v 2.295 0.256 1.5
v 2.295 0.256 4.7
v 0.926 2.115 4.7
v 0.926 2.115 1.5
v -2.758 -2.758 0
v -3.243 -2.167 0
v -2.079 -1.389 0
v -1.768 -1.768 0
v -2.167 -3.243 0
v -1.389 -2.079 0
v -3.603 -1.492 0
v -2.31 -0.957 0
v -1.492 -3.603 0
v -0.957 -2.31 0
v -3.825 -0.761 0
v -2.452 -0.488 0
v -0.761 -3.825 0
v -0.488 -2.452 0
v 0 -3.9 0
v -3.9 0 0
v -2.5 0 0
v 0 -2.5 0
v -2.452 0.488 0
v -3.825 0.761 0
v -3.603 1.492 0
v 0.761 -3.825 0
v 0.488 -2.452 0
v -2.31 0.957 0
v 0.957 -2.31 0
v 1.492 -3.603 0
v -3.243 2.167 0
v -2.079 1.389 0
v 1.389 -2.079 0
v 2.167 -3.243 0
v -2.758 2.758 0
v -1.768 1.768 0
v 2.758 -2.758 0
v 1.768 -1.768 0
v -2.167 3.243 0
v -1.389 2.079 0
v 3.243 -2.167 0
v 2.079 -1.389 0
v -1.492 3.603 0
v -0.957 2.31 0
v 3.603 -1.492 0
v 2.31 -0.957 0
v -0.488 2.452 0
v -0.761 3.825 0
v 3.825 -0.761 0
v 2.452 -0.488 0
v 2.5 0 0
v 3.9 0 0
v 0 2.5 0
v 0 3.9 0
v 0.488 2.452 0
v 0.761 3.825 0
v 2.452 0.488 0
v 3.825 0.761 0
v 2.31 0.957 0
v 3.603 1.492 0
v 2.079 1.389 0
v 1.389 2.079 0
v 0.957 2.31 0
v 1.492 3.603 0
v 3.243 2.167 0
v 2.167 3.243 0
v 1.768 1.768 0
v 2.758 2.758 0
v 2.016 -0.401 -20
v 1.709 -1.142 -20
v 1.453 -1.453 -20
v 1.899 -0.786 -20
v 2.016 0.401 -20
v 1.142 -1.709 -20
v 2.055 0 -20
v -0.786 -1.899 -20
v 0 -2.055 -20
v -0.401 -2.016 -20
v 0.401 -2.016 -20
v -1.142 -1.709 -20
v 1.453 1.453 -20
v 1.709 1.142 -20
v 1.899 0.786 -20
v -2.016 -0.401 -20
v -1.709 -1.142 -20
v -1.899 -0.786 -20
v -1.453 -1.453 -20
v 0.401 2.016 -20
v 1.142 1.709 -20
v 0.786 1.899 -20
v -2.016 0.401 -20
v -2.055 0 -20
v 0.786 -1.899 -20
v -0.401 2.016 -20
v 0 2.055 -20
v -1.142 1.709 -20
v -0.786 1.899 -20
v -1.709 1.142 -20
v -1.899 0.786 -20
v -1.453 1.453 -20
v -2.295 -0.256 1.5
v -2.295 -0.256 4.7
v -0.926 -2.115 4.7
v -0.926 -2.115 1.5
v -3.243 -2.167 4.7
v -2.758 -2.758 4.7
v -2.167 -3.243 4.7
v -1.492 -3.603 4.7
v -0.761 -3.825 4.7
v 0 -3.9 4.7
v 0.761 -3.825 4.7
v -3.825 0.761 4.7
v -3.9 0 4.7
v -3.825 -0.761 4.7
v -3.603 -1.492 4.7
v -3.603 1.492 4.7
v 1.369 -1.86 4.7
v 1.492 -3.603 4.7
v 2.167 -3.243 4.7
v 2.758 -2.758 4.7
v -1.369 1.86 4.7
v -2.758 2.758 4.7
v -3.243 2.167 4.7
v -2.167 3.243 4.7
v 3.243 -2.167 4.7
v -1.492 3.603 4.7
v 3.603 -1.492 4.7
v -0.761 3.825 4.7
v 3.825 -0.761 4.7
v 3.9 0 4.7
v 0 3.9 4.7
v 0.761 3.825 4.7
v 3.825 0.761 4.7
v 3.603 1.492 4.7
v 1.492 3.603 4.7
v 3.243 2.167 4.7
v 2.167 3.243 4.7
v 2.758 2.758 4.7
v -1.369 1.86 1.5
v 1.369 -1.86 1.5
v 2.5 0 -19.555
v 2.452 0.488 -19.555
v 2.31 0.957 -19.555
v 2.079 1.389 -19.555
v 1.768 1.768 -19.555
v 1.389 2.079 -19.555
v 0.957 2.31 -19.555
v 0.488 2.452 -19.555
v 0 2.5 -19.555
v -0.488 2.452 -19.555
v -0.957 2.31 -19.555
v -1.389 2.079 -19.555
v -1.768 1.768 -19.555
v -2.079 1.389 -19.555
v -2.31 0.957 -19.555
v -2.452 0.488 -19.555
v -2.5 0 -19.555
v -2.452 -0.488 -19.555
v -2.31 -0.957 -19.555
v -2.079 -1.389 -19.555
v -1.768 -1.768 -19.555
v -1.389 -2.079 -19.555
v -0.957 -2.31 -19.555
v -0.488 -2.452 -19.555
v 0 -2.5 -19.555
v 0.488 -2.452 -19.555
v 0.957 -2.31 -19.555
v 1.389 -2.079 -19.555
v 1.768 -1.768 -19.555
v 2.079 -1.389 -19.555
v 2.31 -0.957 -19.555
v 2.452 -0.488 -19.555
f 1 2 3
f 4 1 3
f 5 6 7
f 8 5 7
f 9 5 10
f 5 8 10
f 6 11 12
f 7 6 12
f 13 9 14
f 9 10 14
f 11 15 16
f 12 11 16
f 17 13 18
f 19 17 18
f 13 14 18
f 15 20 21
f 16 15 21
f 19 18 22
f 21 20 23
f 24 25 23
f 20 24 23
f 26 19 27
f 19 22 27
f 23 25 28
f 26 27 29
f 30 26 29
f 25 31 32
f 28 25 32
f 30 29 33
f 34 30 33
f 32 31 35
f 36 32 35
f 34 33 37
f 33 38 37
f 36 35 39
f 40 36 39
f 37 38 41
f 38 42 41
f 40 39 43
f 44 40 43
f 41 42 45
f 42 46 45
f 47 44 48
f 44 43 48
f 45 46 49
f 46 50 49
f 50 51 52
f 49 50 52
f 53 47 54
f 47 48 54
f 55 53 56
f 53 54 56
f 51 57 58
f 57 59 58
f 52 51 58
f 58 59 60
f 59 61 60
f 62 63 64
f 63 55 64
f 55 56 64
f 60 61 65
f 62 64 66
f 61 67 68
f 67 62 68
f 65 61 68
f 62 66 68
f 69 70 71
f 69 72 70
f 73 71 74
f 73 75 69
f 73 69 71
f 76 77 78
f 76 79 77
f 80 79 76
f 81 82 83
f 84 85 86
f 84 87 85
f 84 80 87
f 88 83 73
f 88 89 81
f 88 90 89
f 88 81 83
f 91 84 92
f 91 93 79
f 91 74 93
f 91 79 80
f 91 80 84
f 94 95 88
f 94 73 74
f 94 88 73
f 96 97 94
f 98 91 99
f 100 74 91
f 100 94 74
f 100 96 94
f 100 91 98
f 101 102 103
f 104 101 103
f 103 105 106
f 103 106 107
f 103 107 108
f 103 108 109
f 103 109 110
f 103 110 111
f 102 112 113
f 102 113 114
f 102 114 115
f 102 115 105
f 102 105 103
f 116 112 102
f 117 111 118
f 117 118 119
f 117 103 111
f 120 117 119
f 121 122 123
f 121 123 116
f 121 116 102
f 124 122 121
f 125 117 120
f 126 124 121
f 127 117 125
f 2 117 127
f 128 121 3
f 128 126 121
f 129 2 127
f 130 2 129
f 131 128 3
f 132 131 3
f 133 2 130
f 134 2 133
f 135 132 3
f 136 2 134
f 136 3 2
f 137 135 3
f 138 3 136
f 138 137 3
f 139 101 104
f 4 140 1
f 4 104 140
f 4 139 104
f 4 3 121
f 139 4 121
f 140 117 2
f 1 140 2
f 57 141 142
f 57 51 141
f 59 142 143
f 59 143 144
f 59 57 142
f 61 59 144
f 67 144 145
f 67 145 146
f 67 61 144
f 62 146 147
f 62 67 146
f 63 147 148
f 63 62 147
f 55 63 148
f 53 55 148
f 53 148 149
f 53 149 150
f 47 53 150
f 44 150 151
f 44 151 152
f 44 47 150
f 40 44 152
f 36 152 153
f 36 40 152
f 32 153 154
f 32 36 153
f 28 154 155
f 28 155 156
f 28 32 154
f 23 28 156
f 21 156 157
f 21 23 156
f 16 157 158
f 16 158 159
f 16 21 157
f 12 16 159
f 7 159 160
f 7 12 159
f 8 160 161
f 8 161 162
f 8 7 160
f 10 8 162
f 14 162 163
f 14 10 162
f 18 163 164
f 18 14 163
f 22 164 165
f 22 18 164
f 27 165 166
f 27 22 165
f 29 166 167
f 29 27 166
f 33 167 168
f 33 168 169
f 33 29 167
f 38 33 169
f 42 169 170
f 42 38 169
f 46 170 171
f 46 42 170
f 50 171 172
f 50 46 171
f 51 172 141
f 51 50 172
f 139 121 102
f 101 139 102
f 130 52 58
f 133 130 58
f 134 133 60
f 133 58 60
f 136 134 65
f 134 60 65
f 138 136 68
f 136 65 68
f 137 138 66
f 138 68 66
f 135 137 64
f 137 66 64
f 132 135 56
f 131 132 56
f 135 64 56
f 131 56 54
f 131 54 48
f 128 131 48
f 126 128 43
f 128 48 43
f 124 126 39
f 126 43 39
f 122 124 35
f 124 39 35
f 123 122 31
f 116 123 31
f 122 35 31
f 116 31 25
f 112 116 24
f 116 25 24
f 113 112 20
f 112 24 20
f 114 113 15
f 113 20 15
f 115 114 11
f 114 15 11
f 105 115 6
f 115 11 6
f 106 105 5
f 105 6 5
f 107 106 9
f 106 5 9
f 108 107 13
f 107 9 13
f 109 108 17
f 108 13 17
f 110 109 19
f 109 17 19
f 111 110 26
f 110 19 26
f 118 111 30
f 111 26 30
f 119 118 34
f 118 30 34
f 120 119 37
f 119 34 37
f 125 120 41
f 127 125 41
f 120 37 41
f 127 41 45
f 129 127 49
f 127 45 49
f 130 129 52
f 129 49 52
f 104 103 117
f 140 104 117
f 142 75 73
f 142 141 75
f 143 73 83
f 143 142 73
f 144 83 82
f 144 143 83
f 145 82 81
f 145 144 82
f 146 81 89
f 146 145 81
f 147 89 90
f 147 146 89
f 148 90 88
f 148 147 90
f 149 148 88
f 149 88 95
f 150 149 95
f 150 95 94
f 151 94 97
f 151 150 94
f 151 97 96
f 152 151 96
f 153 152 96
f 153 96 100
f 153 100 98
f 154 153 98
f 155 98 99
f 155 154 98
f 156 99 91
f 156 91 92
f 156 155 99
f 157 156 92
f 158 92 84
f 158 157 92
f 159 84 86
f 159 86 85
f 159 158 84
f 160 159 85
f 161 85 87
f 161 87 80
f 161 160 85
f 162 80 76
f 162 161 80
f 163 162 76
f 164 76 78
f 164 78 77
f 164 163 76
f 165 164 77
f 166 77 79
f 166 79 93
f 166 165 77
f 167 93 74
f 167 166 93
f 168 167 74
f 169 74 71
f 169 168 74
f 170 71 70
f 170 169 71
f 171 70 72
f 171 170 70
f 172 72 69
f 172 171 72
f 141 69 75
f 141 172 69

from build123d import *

# Parameters (mm, degrees)
SKETCH1_R           = 3.9
BOSS_EXTRUDE1_DEPTH = 4.7
CUT_EXTRUDE1_DEPTH  = 3.2


# Read off the part's stored shape, not the designer's step: M5x0.8 Machine Threads Stud1
with BuildPart() as part:
    # Sketch1 → Boss-Extrude1 (new body)
    with BuildSketch(Plane.XY):
        Circle(SKETCH1_R)
    extrude(amount=BOSS_EXTRUDE1_DEPTH)

    # M5x0.8 Machine Threads Stud1 outline → M5x0.8 Machine Threads Stud1 (revolve)
    with BuildSketch(Plane.XZ):
        Polygon((0, 0), (0, -20), (2.055, -20), (2.5, -19.555), (2.5, 0), align=None)
    revolve(axis=Axis((0, 0, 0), (0, 0, 1)))

    # Sketch5 → Cut-Extrude1 (cut)
    with BuildSketch(Plane.XY.offset(4.7)):
        Polygon((1.368919171, -1.859944525), (2.295218794, 0.255546515), (0.926299623, 2.11549104), (-1.368919171, 1.859944525), (-2.295218794, -0.255546515), (-0.926299623, -2.11549104), align=None)
    extrude(amount=-CUT_EXTRUDE1_DEPTH, mode=Mode.SUBTRACT)


solid = part.part
